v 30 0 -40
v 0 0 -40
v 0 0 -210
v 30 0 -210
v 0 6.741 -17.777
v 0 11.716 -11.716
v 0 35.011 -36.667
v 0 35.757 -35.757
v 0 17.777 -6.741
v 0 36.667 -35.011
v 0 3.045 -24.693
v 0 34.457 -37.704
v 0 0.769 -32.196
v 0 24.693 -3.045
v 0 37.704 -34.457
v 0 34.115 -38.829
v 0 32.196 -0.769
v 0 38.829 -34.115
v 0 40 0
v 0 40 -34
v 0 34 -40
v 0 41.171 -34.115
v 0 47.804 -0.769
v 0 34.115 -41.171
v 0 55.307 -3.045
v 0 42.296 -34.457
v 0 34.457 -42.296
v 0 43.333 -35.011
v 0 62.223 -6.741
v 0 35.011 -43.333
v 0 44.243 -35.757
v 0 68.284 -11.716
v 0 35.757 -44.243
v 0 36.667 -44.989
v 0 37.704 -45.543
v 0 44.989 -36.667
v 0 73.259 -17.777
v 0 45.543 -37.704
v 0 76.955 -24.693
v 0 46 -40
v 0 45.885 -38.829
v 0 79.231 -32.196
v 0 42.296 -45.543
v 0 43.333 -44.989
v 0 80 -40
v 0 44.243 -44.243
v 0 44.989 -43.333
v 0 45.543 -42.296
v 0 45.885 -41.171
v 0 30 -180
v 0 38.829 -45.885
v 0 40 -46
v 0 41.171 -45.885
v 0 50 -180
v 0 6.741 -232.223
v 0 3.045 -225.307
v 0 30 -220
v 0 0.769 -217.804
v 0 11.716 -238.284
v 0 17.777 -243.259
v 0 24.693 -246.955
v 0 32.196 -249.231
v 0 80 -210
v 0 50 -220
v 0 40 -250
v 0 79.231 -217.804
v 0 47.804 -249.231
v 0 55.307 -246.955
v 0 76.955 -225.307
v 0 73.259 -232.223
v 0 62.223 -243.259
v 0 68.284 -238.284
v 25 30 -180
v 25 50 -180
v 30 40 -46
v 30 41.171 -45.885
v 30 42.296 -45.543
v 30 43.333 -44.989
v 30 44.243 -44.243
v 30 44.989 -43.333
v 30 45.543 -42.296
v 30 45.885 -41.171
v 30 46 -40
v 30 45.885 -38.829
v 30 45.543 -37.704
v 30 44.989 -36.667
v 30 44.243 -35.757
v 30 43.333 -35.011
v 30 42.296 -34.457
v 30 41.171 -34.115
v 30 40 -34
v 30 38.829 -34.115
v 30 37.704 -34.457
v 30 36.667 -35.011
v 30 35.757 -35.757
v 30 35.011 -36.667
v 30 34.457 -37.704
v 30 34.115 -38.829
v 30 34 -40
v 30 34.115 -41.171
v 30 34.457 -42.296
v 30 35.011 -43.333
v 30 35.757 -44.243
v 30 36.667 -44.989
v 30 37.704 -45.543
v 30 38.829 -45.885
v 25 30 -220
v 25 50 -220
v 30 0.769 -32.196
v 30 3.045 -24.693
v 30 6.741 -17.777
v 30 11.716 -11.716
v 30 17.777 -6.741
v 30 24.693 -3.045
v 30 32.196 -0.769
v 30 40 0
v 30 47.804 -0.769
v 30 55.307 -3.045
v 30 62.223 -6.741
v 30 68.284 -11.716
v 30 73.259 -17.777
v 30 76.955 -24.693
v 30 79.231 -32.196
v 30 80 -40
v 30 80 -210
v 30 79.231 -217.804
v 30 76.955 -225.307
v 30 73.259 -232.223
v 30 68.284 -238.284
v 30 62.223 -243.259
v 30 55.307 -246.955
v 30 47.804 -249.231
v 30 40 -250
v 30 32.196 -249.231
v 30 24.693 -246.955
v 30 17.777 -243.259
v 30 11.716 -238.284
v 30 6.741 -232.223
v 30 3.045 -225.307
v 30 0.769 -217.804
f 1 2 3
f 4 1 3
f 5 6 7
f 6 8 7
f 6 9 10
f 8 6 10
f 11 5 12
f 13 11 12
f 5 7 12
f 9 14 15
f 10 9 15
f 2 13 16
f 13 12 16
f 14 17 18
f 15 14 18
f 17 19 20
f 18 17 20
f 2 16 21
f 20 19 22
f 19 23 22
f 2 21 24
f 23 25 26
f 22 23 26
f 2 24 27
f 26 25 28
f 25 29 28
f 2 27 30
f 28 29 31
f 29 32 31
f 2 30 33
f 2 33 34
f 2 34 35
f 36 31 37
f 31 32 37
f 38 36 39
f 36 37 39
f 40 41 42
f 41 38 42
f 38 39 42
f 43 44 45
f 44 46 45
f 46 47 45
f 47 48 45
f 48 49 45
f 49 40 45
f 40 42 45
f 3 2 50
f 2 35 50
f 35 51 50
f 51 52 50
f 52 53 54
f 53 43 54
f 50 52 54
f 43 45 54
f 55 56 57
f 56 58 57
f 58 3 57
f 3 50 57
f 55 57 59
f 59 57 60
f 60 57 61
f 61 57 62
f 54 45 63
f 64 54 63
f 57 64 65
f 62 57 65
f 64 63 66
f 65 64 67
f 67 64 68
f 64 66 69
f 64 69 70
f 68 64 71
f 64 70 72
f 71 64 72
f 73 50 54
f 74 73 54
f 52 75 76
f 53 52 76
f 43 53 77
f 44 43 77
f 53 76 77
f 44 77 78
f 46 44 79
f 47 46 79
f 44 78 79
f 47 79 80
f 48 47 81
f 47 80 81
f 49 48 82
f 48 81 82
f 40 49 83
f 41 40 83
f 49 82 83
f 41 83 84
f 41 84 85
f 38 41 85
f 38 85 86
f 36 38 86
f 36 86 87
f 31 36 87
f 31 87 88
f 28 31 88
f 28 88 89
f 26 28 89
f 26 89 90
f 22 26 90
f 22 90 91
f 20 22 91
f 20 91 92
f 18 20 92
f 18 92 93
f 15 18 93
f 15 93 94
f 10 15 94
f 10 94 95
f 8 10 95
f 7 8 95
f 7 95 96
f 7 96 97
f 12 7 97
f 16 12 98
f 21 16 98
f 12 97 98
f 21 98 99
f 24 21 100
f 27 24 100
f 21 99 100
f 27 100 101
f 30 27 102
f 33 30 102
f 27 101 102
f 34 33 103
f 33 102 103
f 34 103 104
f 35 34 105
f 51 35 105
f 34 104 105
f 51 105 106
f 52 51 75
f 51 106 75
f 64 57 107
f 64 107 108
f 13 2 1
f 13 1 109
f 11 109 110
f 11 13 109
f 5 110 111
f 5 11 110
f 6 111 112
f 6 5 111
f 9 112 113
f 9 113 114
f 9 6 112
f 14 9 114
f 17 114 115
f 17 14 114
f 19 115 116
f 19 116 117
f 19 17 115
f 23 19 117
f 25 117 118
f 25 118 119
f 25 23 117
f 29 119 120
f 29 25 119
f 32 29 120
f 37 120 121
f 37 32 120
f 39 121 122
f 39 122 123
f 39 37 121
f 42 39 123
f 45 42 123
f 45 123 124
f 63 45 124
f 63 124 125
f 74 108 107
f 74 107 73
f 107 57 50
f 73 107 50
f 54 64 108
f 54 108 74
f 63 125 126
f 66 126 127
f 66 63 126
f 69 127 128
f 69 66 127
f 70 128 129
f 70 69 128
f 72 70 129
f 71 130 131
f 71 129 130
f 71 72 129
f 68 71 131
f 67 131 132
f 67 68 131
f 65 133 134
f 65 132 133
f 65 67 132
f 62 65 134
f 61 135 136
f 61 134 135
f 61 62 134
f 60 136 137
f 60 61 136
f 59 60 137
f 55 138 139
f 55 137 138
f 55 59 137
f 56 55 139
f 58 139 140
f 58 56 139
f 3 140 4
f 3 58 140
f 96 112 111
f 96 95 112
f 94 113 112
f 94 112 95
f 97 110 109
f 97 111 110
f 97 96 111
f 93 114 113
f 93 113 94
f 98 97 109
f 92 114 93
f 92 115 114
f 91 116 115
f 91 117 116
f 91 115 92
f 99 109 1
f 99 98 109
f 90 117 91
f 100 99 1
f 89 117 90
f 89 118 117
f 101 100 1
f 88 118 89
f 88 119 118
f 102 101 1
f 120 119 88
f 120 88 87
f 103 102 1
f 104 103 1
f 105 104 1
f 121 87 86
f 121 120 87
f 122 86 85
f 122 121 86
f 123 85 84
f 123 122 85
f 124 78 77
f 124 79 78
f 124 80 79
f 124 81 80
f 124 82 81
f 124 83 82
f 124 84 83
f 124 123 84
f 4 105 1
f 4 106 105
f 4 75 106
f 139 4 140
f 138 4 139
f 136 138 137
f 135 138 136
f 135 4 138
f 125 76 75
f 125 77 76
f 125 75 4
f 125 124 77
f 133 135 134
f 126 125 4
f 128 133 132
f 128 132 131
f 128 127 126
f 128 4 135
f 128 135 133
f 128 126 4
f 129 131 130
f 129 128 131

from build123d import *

# Parameters (mm, degrees)
SKETCH2_W               = 250
SKETCH2_H               = 80
BOSS_EXTRUDE1_DEPTH     = 30
SKETCH11_R              = 6
CUT_EXTRUDE2_DEPTH      = 265.196896272
CUT_EXTRUDE_THIN2_DEPTH = 265.196896272
SKETCH15_W              = 40
SKETCH15_H              = 20
CUT_EXTRUDE3_DEPTH      = 25


with BuildPart() as part:
    # Sketch2 → Boss-Extrude1 (new body)
    with BuildSketch(Plane(origin=(0, 0, 0), x_dir=(0, 0, -1), z_dir=(1, 0, 0))):
        with Locations((125, 40)):
            Rectangle(SKETCH2_W, SKETCH2_H)
    extrude(amount=BOSS_EXTRUDE1_DEPTH)

    # Sketch11 → Cut-Extrude2 (cut, through all)
    with BuildSketch(Plane(origin=(30, 0, 0), x_dir=(0, 0, -1), z_dir=(1, 0, 0))):
        with Locations((40, 40)):
            Circle(SKETCH11_R)
    extrude(amount=-CUT_EXTRUDE2_DEPTH, mode=Mode.SUBTRACT)

    # Sketch14 → Cut-Extrude-Thin2 (cut, through all)
    with BuildSketch(Plane.ZY):
        with BuildLine():
            ThreePointArc((-40, 0), (0, 40), (-40, 80))
            Line((-40, 80), (-40, 90))
            ThreePointArc((-40, 90), (10, 40), (-40, -10))
            Line((-40, -10), (-40, 0))
        make_face()
        with BuildLine():
            ThreePointArc((-210, 80), (-250, 40), (-210, 0))
            Line((-210, 0), (-210, -10))
            ThreePointArc((-210, -10), (-260, 40), (-210, 90))
            Line((-210, 90), (-210, 80))
        make_face()
    extrude(amount=-CUT_EXTRUDE_THIN2_DEPTH, mode=Mode.SUBTRACT)


with BuildPart() as cut_extrude_thin2_kept_piece:
    # of the separate pieces the step leaves, the one the design keeps (cut_extrude_thin2_pieces_kept)
    add(part.part.solids().sort_by_distance((0, 0, -40))[0])

    # Sketch15 → Cut-Extrude3 (cut)
    with BuildSketch(Plane.ZY):
        with Locations((-200, 40)):
            Rectangle(SKETCH15_W, SKETCH15_H)
    extrude(amount=-CUT_EXTRUDE3_DEPTH, mode=Mode.SUBTRACT)


solid = cut_extrude_thin2_kept_piece.part
